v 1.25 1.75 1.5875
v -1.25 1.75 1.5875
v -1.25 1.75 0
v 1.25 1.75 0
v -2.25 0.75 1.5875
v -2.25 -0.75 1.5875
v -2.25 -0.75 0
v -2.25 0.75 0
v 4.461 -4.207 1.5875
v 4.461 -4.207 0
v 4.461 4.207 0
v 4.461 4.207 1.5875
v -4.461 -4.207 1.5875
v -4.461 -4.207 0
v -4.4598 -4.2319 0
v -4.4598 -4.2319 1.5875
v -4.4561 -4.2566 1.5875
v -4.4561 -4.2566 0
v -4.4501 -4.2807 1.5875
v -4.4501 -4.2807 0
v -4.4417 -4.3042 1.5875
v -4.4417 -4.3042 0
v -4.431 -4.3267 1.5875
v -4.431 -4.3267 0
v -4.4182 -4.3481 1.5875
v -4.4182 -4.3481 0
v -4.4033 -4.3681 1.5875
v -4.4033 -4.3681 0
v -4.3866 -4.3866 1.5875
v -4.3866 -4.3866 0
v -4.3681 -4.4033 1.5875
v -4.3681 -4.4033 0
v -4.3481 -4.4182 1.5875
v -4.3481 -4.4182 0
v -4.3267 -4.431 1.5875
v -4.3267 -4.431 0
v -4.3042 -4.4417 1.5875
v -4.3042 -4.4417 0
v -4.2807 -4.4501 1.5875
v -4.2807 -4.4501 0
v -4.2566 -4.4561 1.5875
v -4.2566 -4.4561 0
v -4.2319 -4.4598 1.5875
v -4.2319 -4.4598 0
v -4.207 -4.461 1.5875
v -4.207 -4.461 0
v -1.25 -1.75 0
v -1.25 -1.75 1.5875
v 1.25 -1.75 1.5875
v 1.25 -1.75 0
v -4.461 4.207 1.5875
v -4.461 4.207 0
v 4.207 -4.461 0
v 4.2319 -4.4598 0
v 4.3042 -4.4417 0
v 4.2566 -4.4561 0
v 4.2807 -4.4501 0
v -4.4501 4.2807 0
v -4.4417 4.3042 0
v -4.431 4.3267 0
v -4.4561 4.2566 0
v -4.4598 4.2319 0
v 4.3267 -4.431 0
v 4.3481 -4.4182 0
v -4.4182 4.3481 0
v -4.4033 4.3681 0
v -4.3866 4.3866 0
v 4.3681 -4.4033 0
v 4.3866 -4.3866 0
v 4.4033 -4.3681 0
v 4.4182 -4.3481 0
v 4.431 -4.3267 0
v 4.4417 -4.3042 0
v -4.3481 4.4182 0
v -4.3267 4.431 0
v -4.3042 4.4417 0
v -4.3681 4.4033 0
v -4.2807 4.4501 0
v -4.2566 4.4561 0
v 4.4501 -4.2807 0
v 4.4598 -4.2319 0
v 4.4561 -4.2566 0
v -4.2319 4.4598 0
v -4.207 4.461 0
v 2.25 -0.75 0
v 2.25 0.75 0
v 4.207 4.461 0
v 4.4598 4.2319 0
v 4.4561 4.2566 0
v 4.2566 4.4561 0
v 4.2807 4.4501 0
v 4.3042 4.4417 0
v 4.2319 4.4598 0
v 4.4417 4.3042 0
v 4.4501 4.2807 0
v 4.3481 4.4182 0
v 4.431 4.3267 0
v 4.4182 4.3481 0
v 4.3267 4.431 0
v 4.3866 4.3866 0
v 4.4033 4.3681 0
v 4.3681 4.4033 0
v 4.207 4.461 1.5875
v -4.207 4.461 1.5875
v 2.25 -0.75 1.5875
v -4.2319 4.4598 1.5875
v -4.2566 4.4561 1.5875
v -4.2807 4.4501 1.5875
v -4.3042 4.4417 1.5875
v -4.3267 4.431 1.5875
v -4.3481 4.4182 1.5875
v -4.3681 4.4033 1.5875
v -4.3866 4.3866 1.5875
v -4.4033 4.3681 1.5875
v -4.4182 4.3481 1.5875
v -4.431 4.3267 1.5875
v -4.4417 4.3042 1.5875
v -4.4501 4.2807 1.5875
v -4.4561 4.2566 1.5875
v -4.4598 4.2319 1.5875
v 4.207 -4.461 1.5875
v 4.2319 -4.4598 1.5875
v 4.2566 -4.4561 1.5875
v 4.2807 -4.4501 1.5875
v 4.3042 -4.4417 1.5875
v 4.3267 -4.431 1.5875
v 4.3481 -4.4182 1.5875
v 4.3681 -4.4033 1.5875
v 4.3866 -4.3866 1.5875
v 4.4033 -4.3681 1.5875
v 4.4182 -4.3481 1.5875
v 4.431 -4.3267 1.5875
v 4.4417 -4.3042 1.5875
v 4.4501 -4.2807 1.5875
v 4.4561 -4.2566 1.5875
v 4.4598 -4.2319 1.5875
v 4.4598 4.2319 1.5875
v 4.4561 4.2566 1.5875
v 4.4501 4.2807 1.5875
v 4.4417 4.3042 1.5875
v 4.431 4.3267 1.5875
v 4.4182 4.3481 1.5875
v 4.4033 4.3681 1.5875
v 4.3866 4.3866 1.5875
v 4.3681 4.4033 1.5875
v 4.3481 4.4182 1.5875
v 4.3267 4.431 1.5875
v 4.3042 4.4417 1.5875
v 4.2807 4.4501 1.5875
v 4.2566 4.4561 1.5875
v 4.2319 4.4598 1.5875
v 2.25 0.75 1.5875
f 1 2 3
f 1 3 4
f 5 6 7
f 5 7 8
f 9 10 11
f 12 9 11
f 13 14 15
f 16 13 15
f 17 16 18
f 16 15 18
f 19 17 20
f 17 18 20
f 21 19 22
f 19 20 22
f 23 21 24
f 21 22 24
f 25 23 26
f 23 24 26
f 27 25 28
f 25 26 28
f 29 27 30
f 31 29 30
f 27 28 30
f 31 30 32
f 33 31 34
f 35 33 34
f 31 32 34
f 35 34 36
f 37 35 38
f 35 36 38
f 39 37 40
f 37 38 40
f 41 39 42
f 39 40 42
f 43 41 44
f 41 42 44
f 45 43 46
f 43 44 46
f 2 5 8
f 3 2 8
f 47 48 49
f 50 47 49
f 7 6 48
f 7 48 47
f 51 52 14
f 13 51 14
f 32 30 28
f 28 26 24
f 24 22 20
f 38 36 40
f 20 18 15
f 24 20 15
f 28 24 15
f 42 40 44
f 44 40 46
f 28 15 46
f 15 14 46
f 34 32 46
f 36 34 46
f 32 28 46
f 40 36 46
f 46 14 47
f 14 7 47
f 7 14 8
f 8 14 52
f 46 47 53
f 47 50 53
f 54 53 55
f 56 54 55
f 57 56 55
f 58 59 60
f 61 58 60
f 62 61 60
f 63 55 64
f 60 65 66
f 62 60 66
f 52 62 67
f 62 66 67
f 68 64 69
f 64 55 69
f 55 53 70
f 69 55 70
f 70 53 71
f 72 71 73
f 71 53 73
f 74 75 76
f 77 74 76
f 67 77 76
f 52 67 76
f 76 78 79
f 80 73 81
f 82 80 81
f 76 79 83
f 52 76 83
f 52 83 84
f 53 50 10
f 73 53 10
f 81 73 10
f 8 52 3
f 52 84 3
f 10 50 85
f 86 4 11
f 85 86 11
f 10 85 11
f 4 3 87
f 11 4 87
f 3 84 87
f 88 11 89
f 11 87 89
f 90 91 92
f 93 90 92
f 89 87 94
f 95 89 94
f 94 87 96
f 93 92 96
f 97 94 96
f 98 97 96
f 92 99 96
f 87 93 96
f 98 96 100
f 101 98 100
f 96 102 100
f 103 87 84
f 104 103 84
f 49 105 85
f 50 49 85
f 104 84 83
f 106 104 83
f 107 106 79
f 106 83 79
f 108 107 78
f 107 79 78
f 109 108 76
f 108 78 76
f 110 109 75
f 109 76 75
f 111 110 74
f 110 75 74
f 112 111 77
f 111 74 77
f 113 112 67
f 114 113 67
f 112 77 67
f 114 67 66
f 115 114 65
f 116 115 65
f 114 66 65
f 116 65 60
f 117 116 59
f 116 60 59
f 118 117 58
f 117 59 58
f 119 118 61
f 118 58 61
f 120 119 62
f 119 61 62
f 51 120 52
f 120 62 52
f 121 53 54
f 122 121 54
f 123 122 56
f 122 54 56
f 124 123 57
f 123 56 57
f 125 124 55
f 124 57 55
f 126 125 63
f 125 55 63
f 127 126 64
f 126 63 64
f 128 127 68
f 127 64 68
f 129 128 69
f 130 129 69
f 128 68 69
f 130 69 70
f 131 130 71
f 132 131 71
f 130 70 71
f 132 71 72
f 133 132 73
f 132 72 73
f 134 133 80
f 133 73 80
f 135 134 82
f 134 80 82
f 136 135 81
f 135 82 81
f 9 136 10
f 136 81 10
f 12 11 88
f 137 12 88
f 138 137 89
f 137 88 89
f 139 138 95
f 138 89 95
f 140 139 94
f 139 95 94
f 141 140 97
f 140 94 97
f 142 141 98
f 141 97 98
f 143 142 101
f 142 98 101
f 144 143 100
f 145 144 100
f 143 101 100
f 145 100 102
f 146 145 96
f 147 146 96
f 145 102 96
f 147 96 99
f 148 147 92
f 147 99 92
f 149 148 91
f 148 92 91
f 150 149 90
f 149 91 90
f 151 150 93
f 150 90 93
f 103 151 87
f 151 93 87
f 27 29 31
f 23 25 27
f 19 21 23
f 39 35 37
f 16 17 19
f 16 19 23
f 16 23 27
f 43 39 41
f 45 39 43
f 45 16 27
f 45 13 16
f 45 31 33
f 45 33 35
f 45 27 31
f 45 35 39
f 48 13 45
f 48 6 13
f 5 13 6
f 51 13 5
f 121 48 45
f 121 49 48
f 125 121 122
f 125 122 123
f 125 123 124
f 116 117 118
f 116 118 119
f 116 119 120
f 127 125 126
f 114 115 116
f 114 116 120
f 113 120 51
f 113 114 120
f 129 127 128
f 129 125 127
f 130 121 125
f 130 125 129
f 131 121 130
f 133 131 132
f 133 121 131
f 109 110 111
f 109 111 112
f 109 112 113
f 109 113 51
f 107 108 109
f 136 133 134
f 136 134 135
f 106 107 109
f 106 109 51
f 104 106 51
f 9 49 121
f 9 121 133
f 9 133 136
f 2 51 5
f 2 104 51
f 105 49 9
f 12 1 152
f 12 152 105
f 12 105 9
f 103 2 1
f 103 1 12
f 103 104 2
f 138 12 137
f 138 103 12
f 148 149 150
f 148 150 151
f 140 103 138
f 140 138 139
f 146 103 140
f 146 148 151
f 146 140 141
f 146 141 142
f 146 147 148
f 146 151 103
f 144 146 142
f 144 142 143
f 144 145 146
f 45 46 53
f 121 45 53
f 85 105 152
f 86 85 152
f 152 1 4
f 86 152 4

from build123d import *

# Parameters (mm, degrees)
BOSS_EXTRUDE1_DEPTH = 1.5875
SKETCH2_W           = 4.5
SKETCH2_H           = 3.5
CUT_EXTRUDE1_DEPTH  = 2.5875
CHAMFER1_SIZE       = 1


with BuildPart() as part:
    # Sketch1 → Boss-Extrude1 (new body)
    with BuildSketch(Plane.XY):
        with BuildLine():
            Line((4.207, 4.461), (-4.207, 4.461))
            ThreePointArc((-4.207, 4.461), (-4.386605122, 4.386605122), (-4.461, 4.207))
            Line((-4.461, 4.207), (-4.461, -4.207))
            ThreePointArc((-4.461, -4.207), (-4.386605122, -4.386605122), (-4.207, -4.461))
            Line((-4.207, -4.461), (4.207, -4.461))
            ThreePointArc((4.207, -4.461), (4.386605122, -4.386605122), (4.461, -4.207))
            Line((4.461, -4.207), (4.461, 4.207))
            ThreePointArc((4.461, 4.207), (4.386605122, 4.386605122), (4.207, 4.461))
        make_face()
    extrude(amount=BOSS_EXTRUDE1_DEPTH)

    # Sketch2 → Cut-Extrude1 (cut, through all)
    with BuildSketch(Plane.XY.offset(1.5875)):
        Rectangle(SKETCH2_W, SKETCH2_H)
    extrude(amount=-CUT_EXTRUDE1_DEPTH, mode=Mode.SUBTRACT)

    # Chamfer1
    chamfer1_edges = [part.edges().sort_by_distance(p)[0] for p in [
        (2.25, 1.75, 0.79375),
        (2.25, -1.75, 0.79375),
        (-2.25, -1.75, 0.79375),
        (-2.25, 1.75, 0.79375),
    ]]
    chamfer(chamfer1_edges, length=CHAMFER1_SIZE)


solid = part.part
